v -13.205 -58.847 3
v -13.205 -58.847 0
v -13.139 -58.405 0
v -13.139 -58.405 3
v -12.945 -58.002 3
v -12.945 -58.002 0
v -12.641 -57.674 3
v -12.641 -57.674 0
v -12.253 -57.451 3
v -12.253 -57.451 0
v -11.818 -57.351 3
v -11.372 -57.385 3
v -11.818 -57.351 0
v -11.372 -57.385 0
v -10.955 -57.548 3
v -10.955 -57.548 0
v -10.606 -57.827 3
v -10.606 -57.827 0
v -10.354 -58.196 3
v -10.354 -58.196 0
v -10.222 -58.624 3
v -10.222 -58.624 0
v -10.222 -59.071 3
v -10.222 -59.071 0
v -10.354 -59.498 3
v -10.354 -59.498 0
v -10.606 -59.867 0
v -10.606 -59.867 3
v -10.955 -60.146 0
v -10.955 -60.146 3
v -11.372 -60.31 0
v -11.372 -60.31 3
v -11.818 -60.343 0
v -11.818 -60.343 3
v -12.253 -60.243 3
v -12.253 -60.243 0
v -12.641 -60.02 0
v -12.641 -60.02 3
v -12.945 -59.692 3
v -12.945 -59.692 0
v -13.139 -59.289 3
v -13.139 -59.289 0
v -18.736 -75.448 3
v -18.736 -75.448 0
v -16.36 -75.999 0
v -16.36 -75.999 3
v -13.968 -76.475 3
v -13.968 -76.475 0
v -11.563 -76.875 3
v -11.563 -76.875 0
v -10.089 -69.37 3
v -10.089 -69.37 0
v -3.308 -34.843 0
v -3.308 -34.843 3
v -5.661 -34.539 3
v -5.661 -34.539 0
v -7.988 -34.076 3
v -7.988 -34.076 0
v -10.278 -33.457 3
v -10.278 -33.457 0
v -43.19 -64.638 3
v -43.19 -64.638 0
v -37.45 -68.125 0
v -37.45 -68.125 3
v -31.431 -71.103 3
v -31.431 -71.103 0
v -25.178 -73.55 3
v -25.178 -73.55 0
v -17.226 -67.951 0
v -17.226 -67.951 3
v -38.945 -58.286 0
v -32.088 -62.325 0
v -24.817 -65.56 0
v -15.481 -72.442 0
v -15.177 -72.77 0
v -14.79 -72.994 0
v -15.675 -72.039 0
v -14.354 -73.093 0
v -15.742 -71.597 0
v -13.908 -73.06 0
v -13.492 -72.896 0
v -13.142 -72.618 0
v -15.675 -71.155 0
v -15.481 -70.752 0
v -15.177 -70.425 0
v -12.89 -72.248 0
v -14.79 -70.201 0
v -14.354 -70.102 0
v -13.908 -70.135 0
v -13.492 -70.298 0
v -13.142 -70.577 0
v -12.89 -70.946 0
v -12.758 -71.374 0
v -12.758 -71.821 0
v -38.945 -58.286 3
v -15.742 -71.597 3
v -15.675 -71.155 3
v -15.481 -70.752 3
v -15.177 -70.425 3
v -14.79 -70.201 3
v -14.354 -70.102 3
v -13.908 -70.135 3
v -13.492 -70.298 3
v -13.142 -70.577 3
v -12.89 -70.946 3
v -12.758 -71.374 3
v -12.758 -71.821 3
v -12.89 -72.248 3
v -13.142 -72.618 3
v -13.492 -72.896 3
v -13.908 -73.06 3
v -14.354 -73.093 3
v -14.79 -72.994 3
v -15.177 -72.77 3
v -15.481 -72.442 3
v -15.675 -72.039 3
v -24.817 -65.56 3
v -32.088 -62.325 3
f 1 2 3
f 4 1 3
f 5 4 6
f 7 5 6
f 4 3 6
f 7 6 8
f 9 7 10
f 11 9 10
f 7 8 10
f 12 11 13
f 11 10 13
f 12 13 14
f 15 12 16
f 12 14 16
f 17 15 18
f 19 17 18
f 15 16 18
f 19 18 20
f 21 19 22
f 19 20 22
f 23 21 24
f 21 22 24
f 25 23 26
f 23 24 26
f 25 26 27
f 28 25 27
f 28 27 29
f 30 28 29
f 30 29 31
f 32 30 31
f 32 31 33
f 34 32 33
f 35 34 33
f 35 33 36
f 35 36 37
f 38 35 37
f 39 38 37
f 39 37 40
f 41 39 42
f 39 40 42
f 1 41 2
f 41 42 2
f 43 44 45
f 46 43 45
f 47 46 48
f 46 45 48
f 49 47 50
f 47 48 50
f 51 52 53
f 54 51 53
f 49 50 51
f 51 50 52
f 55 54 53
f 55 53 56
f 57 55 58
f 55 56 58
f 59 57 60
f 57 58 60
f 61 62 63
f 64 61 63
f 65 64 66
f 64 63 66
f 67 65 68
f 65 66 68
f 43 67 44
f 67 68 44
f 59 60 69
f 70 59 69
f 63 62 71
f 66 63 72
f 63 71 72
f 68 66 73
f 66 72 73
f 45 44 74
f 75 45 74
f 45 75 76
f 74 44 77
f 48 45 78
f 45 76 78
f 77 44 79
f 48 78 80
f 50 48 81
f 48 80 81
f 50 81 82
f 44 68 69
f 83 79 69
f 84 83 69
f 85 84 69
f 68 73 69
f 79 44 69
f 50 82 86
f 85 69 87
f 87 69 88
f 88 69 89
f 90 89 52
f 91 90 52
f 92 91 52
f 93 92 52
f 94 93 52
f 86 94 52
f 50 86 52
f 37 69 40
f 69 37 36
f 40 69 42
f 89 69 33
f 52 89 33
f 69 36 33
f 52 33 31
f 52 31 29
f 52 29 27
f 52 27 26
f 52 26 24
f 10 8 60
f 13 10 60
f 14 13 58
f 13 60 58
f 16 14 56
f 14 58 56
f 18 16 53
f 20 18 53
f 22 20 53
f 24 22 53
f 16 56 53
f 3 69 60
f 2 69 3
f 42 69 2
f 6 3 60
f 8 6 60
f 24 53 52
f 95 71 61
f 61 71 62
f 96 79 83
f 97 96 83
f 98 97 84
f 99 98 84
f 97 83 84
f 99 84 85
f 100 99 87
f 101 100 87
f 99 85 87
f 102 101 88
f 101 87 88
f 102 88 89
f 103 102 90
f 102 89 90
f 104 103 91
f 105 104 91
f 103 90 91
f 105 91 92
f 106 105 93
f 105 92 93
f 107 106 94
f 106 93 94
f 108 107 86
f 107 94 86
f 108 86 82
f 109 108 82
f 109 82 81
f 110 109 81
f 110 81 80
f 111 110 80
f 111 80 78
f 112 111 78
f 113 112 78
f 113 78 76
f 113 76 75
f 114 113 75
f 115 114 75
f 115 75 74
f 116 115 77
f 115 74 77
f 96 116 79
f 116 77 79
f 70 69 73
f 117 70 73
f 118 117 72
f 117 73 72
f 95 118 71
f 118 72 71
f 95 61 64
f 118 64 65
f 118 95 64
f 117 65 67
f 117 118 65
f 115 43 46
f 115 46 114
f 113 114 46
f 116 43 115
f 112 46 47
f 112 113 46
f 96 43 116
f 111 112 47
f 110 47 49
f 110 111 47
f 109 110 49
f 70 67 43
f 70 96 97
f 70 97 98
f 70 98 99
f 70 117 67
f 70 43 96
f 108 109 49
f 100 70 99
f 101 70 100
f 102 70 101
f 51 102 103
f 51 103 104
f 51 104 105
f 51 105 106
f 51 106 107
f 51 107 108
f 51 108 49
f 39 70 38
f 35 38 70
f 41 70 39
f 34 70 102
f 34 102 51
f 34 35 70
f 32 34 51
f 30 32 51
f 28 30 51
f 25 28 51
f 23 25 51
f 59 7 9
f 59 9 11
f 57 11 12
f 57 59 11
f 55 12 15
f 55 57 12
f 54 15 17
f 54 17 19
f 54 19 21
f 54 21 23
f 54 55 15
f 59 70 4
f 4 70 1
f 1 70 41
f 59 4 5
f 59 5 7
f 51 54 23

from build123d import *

# Parameters (mm, degrees)
SKETCH_1_R          = 18
LASHENA_DEPTH       = 3
CUT_EXTRUDEA_DEPTH  = 3
WWW_KYTOOL_CN_COUNT = 16
SKETCH_3_R          = 1.5
CUT_EXTRUDE_2_DEPTH = 10
SKETCH_4_R          = 1.5
CUT_EXTRUDE_3_DEPTH = 10
EXTRUDE_1_DEPTH     = 3
SKETCH_6_R          = 1.5
CUT_EXTRUDE_4_DEPTH = 3
SKETCH_7_R          = 35
CUT_EXTRUDE_5_DEPTH = 3


with BuildPart() as part:
    # 草图1 → LaShenA (new body)
    with BuildSketch(Plane.XY):
        Circle(SKETCH_1_R)
    extrude(amount=LASHENA_DEPTH)

    # SketchA → Cut-ExtrudeA (cut)
    with BuildSketch(Plane.XY.offset(3)):
        with BuildLine():
            ThreePointArc((0.423212707, 13.493364703), (0, 13.5), (-0.423212707, 13.493364703))
            ThreePointArc((-0.423212707, 13.493364703), (-0.952770902, 13.685686791), (-1.20440395, 14.18977059))
            add(Edge.make_bspline(
                [(-1.20440395, 14.18977059), (-1.226562505, 14.455224305), (-1.213843633, 14.773889884), (-1.273675597, 15.110607864), (-1.299119688, 15.21139578), (-1.321432077, 15.29109757), (-1.349914152, 15.382250837), (-1.385146673, 15.484587535), (-1.427834192, 15.597770763), (-1.478623281, 15.721446817), (-1.538159915, 15.855229004), (-1.607069773, 15.998703507), (-1.685962928, 16.151428337), (-1.775430978, 16.312934487), (-1.876046532, 16.482726463), (-1.98836201, 16.660283053), (-2.112908684, 16.845058076), (-2.250195688, 17.036481179), (-2.400709063, 17.233958676), (-2.56491084, 17.43687441), (-2.743238138, 17.644590662), (-2.936102365, 17.856449073), (-3.14388814, 18.07177164), (-3.447378451, 18.368492697), (-3.689495989, 18.585006365), (-3.858042439, 18.727457792)],
                knots=[0.122308221, 0.122308221, 0.122308221, 0.122308221, 0.250610689, 0.276296194, 0.287604067, 0.300967916, 0.316387742, 0.333863545, 0.353395324, 0.37498308, 0.398626813, 0.424326522, 0.452082207, 0.48189387, 0.513761509, 0.547685125, 0.583664717, 0.621700286, 0.661791832, 0.703939355, 0.748142854, 0.79440233, 0.842717782, 0.893089212, 1, 1, 1, 1], degree=3))
            ThreePointArc((-3.858042439, 18.727457792), (0, 19.120726106), (3.858042439, 18.727457792))
            add(Edge.make_bspline(
                [(1.20440395, 14.18977059), (1.226562505, 14.455224305), (1.213843633, 14.773889884), (1.273675597, 15.110607864), (1.299119688, 15.21139578), (1.321432077, 15.29109757), (1.349914152, 15.382250837), (1.385146673, 15.484587535), (1.427834192, 15.597770763), (1.478623281, 15.721446817), (1.538159915, 15.855229004), (1.607069773, 15.998703507), (1.685962928, 16.151428337), (1.775430978, 16.312934487), (1.876046532, 16.482726463), (1.98836201, 16.660283053), (2.112908684, 16.845058076), (2.250195688, 17.036481179), (2.400709063, 17.233958676), (2.56491084, 17.43687441), (2.743238138, 17.644590662), (2.936102365, 17.856449073), (3.14388814, 18.07177164), (3.447378451, 18.368492697), (3.689495989, 18.585006365), (3.858042439, 18.727457792)],
                knots=[0.122308221, 0.122308221, 0.122308221, 0.122308221, 0.250610689, 0.276296194, 0.287604067, 0.300967916, 0.316387742, 0.333863545, 0.353395324, 0.37498308, 0.398626813, 0.424326522, 0.452082207, 0.48189387, 0.513761509, 0.547685125, 0.583664717, 0.621700286, 0.661791832, 0.703939355, 0.748142854, 0.79440233, 0.842717782, 0.893089212, 1, 1, 1, 1], degree=3))
            ThreePointArc((1.20440395, 14.18977059), (0.952770902, 13.685686791), (0.423212707, 13.493364703))
        make_face()
    cut_extrudea = extrude(amount=-CUT_EXTRUDEA_DEPTH, mode=Mode.SUBTRACT)

    # www.KYTool.cn: Cut-ExtrudeA ×16 about axis
    www_kytool_cn_axis = Axis((0, 0, -80.9), (0, 0, 1))
    for i in range(1, WWW_KYTOOL_CN_COUNT):
        add(cut_extrudea.rotate(www_kytool_cn_axis, i * 360 / WWW_KYTOOL_CN_COUNT), mode=Mode.SUBTRACT)

    # 草图3 → 切除-拉伸2 (cut)
    with BuildSketch(Plane(origin=(0, 0, 0), x_dir=(-1, 0, 0), z_dir=(0, 0, -1))):
        Circle(SKETCH_3_R)
    extrude(amount=-CUT_EXTRUDE_2_DEPTH, mode=Mode.SUBTRACT)

    # 草图4 → 切除-拉伸3 (cut)
    with BuildSketch(Plane(origin=(0, 0, 0), x_dir=(-1, 0, 0), z_dir=(0, 0, -1))):
        with Locations((5, 0)):
            Circle(SKETCH_4_R)
        with Locations((0, -5)):
            Circle(SKETCH_4_R)
        with Locations((-5, 0)):
            Circle(SKETCH_4_R)
        with Locations((0, 5)):
            Circle(SKETCH_4_R)
    extrude(amount=-CUT_EXTRUDE_3_DEPTH, mode=Mode.SUBTRACT)

    # 草图5 → 凸台-拉伸1 (add)
    with BuildSketch(Plane.XY.offset(3)):
        with BuildLine():
            Line((-3.48199852, -8.406288052), (-6.888301783, -16.629831585))
            Line((-6.888301783, -16.629831585), (-17.226084522, -67.950540756))
            ThreePointArc((-17.226084522, -67.950540756), (-28.498456938, -64.045701878), (-38.945489094, -58.286043408))
            Line((-38.945489094, -58.286043408), (-43.190045675, -64.638471246))
            ThreePointArc((-43.190045675, -64.638471246), (-28.051735714, -72.502497432), (-11.562659331, -76.875333623))
            Line((-11.562659331, -76.875333623), (0, -18))
            Line((0, -18), (0, -9.09890062))
            ThreePointArc((0, -9.09890062), (-1.775107452, -8.924067796), (-3.48199852, -8.406288052))
        make_face()
    extrude(amount=-EXTRUDE_1_DEPTH)

    # 草图6 → 切除-拉伸4 (cut)
    with BuildSketch(Plane(origin=(0, 0, 0), x_dir=(-1, 0, 0), z_dir=(0, 0, -1))):
        with Locations((14.241593507, -71.597325469)):
            Circle(SKETCH_6_R)
        with Locations((11.705419321, -58.847116824)):
            Circle(SKETCH_6_R)
    extrude(amount=-CUT_EXTRUDE_4_DEPTH, mode=Mode.SUBTRACT)

    # 草图7 → 切除-拉伸5 (cut)
    with BuildSketch(Plane(origin=(0, 0, 0), x_dir=(-1, 0, 0), z_dir=(0, 0, -1))):
        Circle(SKETCH_7_R)
    extrude(amount=-CUT_EXTRUDE_5_DEPTH, mode=Mode.SUBTRACT)


solid = part.part
